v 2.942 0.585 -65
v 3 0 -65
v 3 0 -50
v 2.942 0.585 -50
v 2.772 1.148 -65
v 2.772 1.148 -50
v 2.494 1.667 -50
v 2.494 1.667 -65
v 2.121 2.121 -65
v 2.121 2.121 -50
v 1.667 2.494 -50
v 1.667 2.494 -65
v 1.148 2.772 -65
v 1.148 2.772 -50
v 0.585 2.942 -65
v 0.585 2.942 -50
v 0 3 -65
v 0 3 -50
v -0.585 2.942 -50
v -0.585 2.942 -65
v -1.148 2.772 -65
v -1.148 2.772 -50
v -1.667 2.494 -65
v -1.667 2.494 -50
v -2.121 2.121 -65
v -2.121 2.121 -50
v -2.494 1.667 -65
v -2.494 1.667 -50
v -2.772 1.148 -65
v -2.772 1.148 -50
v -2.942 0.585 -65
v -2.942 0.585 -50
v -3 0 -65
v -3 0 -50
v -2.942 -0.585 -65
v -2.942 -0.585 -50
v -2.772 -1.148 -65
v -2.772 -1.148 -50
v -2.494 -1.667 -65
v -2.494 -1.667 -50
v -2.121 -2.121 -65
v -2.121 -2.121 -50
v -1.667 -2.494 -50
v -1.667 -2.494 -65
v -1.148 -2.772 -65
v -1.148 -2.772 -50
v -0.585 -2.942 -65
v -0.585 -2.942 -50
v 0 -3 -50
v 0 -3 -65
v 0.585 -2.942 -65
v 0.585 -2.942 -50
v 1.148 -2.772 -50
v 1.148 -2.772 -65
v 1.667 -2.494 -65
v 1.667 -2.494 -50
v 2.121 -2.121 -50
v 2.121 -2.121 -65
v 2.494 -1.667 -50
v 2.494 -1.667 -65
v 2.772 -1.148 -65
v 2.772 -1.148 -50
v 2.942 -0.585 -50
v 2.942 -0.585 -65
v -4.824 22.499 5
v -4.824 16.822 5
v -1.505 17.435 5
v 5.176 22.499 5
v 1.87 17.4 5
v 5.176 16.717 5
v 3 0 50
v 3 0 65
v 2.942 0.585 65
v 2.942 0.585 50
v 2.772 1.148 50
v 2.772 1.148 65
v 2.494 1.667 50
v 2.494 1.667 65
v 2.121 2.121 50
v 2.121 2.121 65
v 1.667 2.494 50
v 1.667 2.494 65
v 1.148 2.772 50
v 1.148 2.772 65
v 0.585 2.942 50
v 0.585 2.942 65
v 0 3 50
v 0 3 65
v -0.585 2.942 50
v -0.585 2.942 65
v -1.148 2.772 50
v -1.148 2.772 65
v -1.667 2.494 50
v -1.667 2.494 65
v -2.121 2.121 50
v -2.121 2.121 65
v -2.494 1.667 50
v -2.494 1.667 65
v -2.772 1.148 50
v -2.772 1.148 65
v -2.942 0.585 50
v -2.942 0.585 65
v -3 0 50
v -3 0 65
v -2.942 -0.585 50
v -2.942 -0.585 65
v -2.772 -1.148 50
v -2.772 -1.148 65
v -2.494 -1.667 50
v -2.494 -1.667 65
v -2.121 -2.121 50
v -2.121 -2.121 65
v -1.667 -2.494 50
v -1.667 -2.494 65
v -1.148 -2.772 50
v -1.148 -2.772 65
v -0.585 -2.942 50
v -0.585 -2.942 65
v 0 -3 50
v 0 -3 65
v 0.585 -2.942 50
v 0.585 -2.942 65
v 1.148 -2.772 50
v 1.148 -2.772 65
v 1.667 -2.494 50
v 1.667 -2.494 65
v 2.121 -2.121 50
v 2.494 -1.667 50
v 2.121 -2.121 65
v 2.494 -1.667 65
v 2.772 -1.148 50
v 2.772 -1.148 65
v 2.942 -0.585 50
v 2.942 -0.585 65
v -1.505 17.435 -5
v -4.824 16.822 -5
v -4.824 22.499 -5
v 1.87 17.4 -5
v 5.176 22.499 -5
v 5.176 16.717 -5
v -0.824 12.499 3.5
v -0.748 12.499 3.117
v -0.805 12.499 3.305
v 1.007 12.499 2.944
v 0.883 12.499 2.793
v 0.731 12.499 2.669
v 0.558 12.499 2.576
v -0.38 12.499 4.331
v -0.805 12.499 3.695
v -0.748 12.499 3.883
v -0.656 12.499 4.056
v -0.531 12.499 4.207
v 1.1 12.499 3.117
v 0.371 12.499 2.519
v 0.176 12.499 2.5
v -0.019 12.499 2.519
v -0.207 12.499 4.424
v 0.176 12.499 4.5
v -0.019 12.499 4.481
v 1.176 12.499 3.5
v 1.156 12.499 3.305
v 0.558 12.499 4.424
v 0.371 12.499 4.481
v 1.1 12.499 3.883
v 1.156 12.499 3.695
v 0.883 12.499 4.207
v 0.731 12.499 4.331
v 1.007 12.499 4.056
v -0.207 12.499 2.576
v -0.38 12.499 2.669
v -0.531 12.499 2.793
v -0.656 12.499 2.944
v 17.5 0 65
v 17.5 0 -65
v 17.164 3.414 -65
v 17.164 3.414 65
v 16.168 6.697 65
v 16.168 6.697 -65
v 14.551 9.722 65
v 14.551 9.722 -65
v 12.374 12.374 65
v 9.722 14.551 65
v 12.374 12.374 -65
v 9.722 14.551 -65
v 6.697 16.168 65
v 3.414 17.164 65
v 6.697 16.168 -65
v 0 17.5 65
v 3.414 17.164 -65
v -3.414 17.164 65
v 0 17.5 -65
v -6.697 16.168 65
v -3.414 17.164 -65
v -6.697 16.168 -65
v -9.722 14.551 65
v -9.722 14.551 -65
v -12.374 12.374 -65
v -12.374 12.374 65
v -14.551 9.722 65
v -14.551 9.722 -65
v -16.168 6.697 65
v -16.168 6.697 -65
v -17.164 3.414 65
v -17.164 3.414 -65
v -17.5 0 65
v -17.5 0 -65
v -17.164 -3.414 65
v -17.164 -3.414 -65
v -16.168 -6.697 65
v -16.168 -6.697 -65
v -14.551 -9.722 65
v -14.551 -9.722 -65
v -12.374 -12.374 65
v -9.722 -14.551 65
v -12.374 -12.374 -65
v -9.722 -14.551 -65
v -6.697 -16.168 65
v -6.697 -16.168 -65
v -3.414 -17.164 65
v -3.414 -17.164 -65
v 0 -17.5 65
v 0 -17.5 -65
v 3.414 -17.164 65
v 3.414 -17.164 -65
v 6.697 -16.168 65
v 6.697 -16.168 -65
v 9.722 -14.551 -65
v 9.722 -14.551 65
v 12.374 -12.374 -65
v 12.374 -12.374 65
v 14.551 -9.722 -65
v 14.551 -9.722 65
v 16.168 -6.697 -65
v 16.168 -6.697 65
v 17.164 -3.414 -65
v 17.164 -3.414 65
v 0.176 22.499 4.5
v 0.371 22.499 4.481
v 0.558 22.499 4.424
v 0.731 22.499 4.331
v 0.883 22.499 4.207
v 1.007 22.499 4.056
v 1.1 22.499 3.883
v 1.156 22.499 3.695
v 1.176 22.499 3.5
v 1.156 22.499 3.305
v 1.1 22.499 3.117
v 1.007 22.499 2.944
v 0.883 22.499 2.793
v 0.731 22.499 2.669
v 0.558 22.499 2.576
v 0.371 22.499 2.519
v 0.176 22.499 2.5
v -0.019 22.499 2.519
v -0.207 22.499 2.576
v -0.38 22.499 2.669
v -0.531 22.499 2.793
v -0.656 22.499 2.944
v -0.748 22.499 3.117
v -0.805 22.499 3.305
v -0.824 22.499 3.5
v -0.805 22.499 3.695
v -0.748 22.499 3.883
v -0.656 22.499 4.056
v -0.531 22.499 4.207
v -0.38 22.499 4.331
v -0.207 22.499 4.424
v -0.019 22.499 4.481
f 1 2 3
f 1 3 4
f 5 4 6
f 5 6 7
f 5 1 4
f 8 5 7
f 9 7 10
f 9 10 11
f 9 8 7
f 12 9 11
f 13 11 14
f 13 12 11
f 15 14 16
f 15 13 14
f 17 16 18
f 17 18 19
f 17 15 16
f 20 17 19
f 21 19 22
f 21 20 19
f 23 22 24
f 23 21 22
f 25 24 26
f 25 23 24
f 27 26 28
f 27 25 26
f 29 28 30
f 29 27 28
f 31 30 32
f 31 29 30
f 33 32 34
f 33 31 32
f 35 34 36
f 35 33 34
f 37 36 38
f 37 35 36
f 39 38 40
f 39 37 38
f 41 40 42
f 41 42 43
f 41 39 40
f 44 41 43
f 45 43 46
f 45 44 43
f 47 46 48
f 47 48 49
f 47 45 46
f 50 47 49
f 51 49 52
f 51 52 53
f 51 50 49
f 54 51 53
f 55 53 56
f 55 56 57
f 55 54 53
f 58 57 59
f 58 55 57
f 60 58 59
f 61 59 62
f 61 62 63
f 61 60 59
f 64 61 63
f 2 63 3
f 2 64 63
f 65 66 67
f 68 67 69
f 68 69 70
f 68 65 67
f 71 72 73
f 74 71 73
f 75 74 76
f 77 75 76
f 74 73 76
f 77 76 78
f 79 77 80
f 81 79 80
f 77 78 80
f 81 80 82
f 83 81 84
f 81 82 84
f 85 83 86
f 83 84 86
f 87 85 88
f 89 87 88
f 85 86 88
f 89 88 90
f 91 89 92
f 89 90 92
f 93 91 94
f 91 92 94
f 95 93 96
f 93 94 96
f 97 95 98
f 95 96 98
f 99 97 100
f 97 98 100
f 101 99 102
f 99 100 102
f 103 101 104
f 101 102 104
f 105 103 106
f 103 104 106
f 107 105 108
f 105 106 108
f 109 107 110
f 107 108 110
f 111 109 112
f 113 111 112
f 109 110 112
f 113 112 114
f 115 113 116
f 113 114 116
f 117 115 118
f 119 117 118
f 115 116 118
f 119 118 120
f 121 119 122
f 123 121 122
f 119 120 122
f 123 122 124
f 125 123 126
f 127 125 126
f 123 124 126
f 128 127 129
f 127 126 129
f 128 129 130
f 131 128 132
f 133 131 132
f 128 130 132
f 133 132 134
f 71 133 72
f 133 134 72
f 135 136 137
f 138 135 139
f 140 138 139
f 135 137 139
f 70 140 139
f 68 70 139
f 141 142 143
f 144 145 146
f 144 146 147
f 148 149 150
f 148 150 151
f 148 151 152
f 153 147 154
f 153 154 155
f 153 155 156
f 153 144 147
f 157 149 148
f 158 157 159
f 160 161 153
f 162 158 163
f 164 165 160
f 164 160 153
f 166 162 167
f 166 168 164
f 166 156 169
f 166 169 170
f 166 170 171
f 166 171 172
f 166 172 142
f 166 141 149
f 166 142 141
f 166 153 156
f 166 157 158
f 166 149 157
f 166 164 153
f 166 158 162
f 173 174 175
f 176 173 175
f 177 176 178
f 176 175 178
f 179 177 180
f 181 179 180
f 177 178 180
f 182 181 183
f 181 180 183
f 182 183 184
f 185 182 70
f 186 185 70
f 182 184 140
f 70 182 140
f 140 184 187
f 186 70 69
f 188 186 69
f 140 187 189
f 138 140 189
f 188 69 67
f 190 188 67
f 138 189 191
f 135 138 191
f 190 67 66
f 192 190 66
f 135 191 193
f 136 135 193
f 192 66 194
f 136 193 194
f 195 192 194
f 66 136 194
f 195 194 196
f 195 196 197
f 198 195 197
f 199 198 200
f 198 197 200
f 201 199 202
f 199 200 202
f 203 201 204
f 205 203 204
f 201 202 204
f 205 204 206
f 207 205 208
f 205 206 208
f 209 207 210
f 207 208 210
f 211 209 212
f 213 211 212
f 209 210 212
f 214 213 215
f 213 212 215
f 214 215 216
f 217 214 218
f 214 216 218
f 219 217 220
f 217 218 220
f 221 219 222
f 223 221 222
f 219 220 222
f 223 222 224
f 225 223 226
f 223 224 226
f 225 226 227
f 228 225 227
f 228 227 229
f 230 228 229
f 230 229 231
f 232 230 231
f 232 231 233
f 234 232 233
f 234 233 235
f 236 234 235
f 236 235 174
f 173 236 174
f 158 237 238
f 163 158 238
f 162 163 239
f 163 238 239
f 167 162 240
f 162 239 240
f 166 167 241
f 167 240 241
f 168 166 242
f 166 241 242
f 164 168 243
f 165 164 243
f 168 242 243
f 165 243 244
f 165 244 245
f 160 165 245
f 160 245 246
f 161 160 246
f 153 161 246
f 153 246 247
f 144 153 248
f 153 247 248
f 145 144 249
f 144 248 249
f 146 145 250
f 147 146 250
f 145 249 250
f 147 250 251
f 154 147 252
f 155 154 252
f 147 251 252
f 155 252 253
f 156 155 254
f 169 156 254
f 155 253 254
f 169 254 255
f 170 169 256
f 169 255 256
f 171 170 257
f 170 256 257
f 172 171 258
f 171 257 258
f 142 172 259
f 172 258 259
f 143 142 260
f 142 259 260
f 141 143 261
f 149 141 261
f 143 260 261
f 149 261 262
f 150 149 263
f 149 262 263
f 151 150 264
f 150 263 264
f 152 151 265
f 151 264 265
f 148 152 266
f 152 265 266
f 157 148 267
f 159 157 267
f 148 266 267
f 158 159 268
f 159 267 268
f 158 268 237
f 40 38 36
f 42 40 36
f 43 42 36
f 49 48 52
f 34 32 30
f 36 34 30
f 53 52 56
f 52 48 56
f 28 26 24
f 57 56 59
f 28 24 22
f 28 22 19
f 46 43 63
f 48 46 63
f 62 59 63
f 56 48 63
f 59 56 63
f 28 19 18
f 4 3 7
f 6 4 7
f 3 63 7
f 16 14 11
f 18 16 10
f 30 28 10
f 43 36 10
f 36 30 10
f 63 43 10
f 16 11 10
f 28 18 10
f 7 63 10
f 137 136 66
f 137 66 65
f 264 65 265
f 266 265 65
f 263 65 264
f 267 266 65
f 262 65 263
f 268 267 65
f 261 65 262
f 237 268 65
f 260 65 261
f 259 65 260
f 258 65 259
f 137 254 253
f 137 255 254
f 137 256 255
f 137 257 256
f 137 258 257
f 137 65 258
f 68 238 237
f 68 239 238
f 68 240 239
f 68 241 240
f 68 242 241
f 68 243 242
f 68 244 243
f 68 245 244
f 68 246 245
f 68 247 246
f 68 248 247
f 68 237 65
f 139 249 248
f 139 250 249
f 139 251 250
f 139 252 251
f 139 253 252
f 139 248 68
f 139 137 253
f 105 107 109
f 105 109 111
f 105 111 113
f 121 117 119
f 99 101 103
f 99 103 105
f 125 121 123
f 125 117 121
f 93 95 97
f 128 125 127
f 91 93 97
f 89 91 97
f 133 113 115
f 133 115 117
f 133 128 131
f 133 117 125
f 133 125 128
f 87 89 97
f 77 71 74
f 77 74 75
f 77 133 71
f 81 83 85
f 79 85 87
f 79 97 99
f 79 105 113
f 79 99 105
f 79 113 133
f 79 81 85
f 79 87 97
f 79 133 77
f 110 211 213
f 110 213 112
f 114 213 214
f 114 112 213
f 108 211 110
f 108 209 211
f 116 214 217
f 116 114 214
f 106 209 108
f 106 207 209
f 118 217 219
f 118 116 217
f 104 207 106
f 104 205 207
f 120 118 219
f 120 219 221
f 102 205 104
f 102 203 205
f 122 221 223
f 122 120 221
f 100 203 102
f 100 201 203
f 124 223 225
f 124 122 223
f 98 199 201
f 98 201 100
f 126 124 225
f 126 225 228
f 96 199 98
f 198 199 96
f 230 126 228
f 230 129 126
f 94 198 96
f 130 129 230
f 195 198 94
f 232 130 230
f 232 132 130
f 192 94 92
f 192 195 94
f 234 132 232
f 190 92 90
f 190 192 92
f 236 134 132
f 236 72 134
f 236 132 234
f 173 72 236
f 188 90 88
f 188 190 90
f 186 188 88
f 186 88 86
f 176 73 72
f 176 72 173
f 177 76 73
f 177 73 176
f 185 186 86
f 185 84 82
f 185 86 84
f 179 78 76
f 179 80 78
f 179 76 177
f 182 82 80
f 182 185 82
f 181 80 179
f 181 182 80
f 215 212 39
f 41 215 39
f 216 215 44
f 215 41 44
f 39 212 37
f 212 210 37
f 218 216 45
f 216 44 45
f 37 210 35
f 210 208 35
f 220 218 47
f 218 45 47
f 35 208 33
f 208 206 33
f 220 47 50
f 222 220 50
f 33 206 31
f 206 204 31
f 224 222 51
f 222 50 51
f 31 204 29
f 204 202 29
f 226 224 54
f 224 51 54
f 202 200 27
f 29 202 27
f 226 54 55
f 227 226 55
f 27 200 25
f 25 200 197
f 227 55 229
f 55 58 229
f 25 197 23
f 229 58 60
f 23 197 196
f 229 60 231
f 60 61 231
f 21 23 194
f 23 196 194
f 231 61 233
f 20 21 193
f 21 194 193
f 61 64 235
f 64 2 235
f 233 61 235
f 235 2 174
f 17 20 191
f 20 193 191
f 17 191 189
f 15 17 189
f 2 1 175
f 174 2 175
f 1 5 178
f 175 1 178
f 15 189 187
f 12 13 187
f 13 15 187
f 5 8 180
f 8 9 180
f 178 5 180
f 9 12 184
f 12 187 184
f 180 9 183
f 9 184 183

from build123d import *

# Parameters (mm, degrees)
BOSS_EXTRUDE2_DEPTH      = 65
BOSS_EXTRUDE2_DEPTH_BACK = 65
SKETCH1_R                = 17.5
BOSS_EXTRUDE3_DEPTH      = 5
BOSS_EXTRUDE3_DEPTH_BACK = 5
SKETCH3_R                = 3
CUT_EXTRUDE1_DEPTH       = 15
SKETCH4_R                = 1
CUT_EXTRUDE2_DEPTH       = 10


with BuildPart() as part:
    # Sketch1 → Boss-Extrude2 (new, two sides: drawn at the far end of the back side and taken through both)
    with BuildSketch(Plane.XY.offset(-BOSS_EXTRUDE2_DEPTH_BACK)):
        Circle(SKETCH1_R)
    extrude(amount=BOSS_EXTRUDE2_DEPTH + BOSS_EXTRUDE2_DEPTH_BACK)

    # Sketch2 → Boss-Extrude3 (add, two sides: drawn at the far end of the back side and taken through both)
    with BuildSketch(Plane.XY.offset(-BOSS_EXTRUDE3_DEPTH_BACK)):
        Polygon((5.175667468, 22.49911829), (-4.824332532, 22.49911829), (-4.824332532, 12.49911829), (0, 12.49911829), (5.175667468, 12.49911829), align=None)
    extrude(amount=BOSS_EXTRUDE3_DEPTH + BOSS_EXTRUDE3_DEPTH_BACK)

    # Sketch3 → Cut-Extrude1 (cut)
    with BuildSketch(Plane.XY.offset(65)):
        Circle(SKETCH3_R)
    cut_extrude1 = extrude(amount=-CUT_EXTRUDE1_DEPTH, mode=Mode.SUBTRACT)

    # Mirror1: Cut-Extrude1 across plane
    add(cut_extrude1.mirror(Plane.XY), mode=Mode.SUBTRACT)

    # Sketch4 → Cut-Extrude2 (cut)
    with BuildSketch(Plane(origin=(0, 22.49911829, 0), x_dir=(1, 0, 0), z_dir=(0, 1, 0))):
        with Locations((0.175667468, -3.5)):
            Circle(SKETCH4_R)
    extrude(amount=-CUT_EXTRUDE2_DEPTH, mode=Mode.SUBTRACT)


solid = part.part
